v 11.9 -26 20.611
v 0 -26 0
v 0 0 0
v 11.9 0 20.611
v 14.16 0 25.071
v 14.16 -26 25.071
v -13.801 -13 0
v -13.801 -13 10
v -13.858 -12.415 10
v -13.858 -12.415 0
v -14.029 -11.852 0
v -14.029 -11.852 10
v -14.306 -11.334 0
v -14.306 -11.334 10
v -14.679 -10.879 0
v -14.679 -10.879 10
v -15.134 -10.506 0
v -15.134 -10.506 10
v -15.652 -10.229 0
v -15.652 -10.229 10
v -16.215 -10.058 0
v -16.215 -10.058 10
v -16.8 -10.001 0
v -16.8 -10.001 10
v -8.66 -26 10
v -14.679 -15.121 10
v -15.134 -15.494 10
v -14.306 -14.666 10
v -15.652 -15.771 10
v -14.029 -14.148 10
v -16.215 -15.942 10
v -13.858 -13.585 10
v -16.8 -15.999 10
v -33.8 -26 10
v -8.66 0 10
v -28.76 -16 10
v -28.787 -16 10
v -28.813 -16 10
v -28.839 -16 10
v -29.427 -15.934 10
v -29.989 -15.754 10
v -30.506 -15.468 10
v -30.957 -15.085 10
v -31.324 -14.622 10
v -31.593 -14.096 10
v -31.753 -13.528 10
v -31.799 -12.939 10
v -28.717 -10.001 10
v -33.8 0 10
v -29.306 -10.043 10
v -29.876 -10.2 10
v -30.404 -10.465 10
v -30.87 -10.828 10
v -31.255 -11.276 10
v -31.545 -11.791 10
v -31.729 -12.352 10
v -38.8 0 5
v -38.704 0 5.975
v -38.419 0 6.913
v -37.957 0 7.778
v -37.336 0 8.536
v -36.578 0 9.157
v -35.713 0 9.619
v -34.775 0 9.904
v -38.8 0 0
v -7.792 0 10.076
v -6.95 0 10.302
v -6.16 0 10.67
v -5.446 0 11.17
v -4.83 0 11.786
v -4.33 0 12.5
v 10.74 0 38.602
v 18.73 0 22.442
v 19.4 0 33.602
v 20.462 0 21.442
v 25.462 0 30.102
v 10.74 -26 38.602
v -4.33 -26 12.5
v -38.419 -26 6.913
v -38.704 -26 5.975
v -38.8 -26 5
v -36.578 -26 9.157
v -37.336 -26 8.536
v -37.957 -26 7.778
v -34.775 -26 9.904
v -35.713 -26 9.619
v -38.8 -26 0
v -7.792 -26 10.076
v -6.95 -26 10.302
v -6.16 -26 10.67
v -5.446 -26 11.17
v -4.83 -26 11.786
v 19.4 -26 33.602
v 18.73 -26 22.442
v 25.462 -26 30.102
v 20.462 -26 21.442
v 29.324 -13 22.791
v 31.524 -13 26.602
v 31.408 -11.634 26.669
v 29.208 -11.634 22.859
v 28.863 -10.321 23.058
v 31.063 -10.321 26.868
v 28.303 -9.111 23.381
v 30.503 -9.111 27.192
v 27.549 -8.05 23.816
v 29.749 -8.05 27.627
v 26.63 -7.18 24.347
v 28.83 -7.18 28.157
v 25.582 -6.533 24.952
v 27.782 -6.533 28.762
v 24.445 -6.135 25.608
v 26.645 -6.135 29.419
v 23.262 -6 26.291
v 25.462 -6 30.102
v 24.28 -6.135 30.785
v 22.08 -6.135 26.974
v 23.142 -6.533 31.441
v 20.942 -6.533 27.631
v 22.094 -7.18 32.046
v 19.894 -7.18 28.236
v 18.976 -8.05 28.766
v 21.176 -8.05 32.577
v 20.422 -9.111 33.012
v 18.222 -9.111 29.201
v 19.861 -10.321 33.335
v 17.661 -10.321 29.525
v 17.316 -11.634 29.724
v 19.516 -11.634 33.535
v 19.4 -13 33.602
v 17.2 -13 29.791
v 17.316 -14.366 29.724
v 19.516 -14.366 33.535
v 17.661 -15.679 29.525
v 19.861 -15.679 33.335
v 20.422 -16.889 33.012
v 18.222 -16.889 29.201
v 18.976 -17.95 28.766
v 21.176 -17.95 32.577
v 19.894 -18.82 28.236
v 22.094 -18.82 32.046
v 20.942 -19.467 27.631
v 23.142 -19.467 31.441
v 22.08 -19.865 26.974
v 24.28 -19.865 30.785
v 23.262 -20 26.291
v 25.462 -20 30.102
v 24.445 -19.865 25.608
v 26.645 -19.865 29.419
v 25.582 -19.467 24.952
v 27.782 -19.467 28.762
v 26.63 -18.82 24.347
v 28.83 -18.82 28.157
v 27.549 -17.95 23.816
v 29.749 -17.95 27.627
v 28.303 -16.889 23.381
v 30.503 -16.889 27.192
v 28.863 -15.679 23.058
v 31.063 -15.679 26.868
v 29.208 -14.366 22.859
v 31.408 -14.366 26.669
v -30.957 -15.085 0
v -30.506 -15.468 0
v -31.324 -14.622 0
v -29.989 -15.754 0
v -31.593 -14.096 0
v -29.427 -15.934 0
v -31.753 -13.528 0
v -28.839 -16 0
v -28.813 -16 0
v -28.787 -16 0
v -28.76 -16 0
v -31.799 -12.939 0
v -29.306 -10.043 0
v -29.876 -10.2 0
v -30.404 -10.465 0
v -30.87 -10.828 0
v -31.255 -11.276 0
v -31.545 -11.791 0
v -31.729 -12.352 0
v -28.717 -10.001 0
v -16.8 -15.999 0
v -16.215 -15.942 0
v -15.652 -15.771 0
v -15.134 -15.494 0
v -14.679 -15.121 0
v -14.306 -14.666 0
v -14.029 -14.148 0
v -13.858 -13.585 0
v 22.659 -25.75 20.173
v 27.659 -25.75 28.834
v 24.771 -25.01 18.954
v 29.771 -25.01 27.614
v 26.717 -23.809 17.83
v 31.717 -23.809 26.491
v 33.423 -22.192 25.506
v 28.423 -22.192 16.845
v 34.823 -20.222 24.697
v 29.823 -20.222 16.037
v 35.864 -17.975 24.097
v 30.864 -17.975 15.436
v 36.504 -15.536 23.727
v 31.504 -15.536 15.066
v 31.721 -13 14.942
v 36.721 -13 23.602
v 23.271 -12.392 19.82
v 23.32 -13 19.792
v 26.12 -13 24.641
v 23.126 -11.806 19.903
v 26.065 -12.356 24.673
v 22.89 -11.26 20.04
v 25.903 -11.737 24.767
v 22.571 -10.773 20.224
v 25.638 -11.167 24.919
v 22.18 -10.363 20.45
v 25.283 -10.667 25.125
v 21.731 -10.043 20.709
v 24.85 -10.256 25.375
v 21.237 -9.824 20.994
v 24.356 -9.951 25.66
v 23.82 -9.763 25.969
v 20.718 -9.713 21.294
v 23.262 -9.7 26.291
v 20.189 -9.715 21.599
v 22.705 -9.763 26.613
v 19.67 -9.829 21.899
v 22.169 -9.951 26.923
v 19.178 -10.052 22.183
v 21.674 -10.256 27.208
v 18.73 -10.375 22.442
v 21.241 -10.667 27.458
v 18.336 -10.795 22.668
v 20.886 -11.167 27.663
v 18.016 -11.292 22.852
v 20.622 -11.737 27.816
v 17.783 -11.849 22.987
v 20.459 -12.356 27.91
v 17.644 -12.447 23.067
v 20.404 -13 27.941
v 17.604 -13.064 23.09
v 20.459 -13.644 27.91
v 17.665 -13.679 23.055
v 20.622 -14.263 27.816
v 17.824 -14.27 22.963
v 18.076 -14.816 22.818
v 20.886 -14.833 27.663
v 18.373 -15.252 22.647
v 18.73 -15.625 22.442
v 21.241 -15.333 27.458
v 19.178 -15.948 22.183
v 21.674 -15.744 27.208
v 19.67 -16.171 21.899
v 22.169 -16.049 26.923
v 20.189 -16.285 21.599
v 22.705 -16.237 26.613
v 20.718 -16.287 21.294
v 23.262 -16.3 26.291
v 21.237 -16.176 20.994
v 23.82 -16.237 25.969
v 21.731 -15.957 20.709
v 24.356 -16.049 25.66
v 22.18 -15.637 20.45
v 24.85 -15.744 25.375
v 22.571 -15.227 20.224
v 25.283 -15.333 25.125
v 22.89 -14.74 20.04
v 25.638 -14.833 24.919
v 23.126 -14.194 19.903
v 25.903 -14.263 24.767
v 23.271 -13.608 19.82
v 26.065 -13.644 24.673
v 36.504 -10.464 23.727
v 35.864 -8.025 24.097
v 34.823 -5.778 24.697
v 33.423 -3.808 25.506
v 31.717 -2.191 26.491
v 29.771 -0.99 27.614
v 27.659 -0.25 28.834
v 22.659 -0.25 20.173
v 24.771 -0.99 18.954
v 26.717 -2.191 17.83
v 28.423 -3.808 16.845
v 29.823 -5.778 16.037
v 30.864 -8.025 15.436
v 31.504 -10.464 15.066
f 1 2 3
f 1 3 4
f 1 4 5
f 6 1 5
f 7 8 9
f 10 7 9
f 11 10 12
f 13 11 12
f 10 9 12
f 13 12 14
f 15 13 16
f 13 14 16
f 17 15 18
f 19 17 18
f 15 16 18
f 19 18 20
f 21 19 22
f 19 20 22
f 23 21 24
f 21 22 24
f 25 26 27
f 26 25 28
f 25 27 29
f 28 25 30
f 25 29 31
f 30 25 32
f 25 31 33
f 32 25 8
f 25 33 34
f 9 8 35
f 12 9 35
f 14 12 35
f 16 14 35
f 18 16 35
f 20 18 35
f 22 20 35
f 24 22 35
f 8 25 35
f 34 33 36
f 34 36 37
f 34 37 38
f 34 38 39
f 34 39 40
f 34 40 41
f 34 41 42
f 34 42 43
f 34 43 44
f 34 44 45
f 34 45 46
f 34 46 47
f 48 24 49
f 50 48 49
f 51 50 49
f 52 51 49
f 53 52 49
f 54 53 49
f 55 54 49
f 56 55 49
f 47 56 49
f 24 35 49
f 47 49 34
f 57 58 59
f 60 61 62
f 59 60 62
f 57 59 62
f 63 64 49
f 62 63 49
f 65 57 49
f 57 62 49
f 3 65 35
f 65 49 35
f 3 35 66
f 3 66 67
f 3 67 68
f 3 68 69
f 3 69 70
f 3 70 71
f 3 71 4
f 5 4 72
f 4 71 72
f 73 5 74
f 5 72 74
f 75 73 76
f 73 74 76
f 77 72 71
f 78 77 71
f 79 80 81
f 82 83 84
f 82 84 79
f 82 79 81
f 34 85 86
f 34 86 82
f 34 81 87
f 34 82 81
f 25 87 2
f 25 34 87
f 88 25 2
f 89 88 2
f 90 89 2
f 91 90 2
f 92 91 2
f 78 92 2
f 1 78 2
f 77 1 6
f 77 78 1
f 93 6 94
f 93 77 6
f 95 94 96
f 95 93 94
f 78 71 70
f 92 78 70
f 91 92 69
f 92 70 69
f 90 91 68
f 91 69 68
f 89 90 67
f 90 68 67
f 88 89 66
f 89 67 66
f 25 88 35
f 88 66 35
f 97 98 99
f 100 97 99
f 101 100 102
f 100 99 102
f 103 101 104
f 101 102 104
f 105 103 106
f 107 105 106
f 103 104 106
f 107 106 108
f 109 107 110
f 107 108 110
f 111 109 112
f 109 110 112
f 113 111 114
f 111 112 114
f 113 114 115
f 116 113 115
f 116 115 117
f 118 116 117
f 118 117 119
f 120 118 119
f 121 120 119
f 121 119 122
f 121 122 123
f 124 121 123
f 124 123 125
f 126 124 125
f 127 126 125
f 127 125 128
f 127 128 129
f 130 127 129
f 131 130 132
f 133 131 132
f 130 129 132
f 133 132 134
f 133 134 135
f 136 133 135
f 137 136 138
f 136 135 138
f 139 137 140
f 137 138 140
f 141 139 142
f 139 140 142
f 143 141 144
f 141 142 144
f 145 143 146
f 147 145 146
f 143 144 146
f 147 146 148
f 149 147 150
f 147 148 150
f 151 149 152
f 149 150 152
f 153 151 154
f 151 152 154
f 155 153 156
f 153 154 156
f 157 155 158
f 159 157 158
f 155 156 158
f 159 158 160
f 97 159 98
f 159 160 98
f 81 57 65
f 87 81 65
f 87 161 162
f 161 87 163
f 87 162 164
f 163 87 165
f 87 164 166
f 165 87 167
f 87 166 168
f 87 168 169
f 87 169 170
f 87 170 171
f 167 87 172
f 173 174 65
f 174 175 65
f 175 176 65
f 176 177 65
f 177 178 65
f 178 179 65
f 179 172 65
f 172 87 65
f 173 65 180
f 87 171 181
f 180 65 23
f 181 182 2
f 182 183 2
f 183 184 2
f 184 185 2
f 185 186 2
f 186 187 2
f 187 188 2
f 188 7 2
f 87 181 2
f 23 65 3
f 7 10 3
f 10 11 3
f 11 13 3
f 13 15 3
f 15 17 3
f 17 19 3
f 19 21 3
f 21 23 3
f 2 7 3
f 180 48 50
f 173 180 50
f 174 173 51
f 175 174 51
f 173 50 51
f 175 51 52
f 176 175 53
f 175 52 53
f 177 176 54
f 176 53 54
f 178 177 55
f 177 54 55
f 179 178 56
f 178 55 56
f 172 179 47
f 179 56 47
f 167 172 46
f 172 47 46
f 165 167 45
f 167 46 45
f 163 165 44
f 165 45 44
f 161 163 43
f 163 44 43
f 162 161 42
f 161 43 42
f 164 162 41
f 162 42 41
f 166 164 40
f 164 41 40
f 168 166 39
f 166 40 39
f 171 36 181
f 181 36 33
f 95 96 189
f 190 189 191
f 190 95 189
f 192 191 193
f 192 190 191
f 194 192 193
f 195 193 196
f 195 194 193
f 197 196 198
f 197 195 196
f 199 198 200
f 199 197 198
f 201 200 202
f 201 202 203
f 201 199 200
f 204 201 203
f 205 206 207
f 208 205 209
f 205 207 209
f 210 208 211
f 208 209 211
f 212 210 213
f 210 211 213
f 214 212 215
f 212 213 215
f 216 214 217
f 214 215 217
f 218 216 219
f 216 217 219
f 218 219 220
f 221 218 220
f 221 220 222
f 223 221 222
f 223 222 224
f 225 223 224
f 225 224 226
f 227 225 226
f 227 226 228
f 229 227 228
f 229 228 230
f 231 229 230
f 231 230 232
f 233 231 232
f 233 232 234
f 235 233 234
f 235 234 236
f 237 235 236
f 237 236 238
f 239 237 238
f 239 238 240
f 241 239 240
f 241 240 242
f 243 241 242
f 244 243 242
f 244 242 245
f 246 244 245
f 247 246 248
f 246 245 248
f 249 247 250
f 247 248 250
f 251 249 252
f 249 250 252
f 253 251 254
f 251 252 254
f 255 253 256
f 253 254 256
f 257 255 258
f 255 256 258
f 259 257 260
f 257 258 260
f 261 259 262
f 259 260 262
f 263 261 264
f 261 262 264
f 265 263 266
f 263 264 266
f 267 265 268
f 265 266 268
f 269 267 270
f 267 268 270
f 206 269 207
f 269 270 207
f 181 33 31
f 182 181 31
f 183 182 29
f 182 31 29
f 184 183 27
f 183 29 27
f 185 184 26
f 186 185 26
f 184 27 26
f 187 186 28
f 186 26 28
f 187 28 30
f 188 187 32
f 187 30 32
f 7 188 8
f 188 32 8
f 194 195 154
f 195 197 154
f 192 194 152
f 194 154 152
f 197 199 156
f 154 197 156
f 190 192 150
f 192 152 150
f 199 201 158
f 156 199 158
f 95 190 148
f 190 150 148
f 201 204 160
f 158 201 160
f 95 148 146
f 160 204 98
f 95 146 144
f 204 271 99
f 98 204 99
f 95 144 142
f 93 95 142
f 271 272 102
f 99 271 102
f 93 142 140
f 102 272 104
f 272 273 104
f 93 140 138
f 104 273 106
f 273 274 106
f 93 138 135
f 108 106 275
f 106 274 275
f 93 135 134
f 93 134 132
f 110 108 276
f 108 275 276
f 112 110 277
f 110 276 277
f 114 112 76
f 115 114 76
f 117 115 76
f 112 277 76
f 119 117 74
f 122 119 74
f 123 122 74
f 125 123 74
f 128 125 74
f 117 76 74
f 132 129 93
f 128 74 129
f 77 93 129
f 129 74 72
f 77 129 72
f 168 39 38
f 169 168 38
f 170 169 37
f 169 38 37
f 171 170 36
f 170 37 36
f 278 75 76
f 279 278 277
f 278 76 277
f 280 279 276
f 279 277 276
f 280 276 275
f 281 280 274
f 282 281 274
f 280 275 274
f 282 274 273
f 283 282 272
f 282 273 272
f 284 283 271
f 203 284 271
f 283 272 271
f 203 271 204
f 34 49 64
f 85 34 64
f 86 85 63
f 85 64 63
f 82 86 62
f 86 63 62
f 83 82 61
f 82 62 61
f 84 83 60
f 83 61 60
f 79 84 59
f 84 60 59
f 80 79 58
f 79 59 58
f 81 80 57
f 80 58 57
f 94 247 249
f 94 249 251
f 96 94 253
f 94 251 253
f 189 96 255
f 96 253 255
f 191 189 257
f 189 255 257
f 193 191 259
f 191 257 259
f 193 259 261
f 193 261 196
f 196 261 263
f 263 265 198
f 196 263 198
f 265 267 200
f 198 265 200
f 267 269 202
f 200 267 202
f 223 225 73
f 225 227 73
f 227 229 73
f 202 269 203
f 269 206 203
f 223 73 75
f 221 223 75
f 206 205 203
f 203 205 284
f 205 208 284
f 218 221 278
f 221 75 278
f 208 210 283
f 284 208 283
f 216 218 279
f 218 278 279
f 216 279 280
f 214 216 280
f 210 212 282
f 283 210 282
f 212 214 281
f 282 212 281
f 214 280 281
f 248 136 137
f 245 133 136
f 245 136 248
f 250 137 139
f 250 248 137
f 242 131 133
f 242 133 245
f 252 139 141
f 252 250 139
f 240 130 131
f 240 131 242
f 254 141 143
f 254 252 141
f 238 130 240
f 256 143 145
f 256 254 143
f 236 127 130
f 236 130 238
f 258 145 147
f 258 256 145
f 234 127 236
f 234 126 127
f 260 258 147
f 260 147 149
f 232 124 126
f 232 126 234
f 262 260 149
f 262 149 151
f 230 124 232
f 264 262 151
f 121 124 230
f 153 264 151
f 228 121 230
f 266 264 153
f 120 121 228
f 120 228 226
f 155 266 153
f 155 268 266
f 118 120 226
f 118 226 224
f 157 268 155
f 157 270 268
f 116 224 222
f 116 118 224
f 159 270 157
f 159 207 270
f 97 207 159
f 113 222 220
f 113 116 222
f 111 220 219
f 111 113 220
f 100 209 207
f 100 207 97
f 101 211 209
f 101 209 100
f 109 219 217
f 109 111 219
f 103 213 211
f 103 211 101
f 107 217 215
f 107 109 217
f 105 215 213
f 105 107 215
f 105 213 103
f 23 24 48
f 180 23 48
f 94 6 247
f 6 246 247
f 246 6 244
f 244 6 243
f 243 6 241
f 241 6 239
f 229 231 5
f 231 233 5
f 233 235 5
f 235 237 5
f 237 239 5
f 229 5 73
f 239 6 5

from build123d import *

# Parameters (mm, degrees)
F1_DEPTH = 26
F3_DEPTH = 10.001
F4_R     = 12.99999
F5_R     = 7
F6_DEPTH = 4.4
F7_R     = 3.3
F8_DEPTH = 53.801


# Not quite as in the source:
# - a fillet or chamfer is up to 0.001 mm smaller than in the source, because OpenCascade refuses the exact size


with BuildPart() as f1:
    # F0 (on Front) → F1 (new body)
    with BuildSketch(Plane.XZ):
        with BuildLine():
            Line((-38.8, 0), (0, 0))
            Line((0, 0), (11.9, 20.6114046101))
            Line((11.9, 20.6114046101), (14.1603821252, 25.0713006457))
            Line((14.1603821252, 25.0713006457), (18.7301270189, 22.441531629))
            Line((18.7301270189, 22.441531629), (31.7205080757, 14.941531629))
            Line((31.7205080757, 14.941531629), (36.7205080757, 23.6017856668))
            Line((36.7205080757, 23.6017856668), (19.4, 33.6017856668))
            Line((19.4, 33.6017856668), (10.7397459622, 38.6017856668))
            Line((10.7397459622, 38.6017856668), (-4.3301270189, 12.5))
            ThreePointArc((-4.3301270189, 12.5), (-6.1602540378, 10.6698729811), (-8.6602540378, 10))
            Line((-8.6602540378, 10), (-33.8, 10))
            ThreePointArc((-33.8, 10), (-37.3355339059, 8.5355339059), (-38.8, 5))
            Line((-38.8, 5), (-38.8, 0))
        make_face()
    extrude(amount=F1_DEPTH)

    # F2 (on face) → F3 (cut, through all)
    with BuildSketch(Plane.XY.offset(10)):
        with BuildLine():
            ThreePointArc((-28.7603622502, -15.99973813), (-26.6647115828, -15.1072596839), (-25.8, -13))
            ThreePointArc((-25.8, -13), (-26.6495430639, -10.9082220563), (-28.7170233106, -10.0011477414))
            ThreePointArc((-28.7170233106, -10.0011477414), (-31.7993750812, -12.9387699222), (-28.839480247, -15.9997402071))
            Line((-28.839480247, -15.9997402071), (-28.7603622502, -15.99973813))
        make_face()
        with BuildLine():
            ThreePointArc((-28.7170233106, -10.0011477414), (-26.6495430639, -10.9082220563), (-25.8, -13))
            ThreePointArc((-25.8, -13), (-26.6647115828, -15.1072596839), (-28.7603622502, -15.99973813))
            Line((-28.7603622502, -15.99973813), (-16.7999212569, -15.9994241356))
            ThreePointArc((-16.7999212569, -15.9994241356), (-19.7994241345, -13.0001113407), (-16.8001439382, -10.0005758668))
            Line((-16.8001439382, -10.0005758668), (-28.7170233106, -10.0011477414))
        make_face()
        with BuildLine():
            ThreePointArc((-28.839480247, -15.9997402071), (-28.7999212418, -15.999999999), (-28.7603622502, -15.99973813))
            Line((-28.7603622502, -15.99973813), (-28.839480247, -15.9997402071))
        make_face()
        with BuildLine():
            ThreePointArc((-13.8005758634, -13), (-14.6791377438, -10.8790359641), (-16.8001439382, -10.0005758668))
            ThreePointArc((-16.8001439382, -10.0005758668), (-19.7994241345, -13.0001113407), (-16.7999212569, -15.9994241356))
            ThreePointArc((-16.7999212569, -15.9994241356), (-14.6790590136, -15.1208853066), (-13.8005758634, -13))
        make_face()
    extrude(amount=-F3_DEPTH, mode=Mode.SUBTRACT)

    # F4 (radius 13 in the source; OpenCascade refuses exactly that, so slightly less here)
    f4_edges = [f1.edges().sort_by_distance(p)[0] for p in [
        (34.220508, -26, 19.271659),
        (34.220508, 0, 19.271659),
    ]]
    fillet(f4_edges, radius=F4_R)

    # F5 (on face) → F6 (cut)
    with BuildSketch(Plane(origin=(19.4, 0, 33.6017856668), x_dir=(0.8660254038, 0, -0.5), z_dir=(0.5, 0, 0.8660254038))):
        with Locations((7, -13)):
            Circle(F5_R)
    extrude(amount=-F6_DEPTH, mode=Mode.SUBTRACT)

    # F7 (on face) → F8 (cut, through all)
    with BuildSketch(Plane(origin=(17.2, 0, 29.7912738902), x_dir=(0.8660254038, 0, -0.5), z_dir=(0.5, 0, 0.8660254038))):
        with Locations((7, -13)):
            Circle(F7_R)
    extrude(amount=-F8_DEPTH, mode=Mode.SUBTRACT)


solid = f1.part
